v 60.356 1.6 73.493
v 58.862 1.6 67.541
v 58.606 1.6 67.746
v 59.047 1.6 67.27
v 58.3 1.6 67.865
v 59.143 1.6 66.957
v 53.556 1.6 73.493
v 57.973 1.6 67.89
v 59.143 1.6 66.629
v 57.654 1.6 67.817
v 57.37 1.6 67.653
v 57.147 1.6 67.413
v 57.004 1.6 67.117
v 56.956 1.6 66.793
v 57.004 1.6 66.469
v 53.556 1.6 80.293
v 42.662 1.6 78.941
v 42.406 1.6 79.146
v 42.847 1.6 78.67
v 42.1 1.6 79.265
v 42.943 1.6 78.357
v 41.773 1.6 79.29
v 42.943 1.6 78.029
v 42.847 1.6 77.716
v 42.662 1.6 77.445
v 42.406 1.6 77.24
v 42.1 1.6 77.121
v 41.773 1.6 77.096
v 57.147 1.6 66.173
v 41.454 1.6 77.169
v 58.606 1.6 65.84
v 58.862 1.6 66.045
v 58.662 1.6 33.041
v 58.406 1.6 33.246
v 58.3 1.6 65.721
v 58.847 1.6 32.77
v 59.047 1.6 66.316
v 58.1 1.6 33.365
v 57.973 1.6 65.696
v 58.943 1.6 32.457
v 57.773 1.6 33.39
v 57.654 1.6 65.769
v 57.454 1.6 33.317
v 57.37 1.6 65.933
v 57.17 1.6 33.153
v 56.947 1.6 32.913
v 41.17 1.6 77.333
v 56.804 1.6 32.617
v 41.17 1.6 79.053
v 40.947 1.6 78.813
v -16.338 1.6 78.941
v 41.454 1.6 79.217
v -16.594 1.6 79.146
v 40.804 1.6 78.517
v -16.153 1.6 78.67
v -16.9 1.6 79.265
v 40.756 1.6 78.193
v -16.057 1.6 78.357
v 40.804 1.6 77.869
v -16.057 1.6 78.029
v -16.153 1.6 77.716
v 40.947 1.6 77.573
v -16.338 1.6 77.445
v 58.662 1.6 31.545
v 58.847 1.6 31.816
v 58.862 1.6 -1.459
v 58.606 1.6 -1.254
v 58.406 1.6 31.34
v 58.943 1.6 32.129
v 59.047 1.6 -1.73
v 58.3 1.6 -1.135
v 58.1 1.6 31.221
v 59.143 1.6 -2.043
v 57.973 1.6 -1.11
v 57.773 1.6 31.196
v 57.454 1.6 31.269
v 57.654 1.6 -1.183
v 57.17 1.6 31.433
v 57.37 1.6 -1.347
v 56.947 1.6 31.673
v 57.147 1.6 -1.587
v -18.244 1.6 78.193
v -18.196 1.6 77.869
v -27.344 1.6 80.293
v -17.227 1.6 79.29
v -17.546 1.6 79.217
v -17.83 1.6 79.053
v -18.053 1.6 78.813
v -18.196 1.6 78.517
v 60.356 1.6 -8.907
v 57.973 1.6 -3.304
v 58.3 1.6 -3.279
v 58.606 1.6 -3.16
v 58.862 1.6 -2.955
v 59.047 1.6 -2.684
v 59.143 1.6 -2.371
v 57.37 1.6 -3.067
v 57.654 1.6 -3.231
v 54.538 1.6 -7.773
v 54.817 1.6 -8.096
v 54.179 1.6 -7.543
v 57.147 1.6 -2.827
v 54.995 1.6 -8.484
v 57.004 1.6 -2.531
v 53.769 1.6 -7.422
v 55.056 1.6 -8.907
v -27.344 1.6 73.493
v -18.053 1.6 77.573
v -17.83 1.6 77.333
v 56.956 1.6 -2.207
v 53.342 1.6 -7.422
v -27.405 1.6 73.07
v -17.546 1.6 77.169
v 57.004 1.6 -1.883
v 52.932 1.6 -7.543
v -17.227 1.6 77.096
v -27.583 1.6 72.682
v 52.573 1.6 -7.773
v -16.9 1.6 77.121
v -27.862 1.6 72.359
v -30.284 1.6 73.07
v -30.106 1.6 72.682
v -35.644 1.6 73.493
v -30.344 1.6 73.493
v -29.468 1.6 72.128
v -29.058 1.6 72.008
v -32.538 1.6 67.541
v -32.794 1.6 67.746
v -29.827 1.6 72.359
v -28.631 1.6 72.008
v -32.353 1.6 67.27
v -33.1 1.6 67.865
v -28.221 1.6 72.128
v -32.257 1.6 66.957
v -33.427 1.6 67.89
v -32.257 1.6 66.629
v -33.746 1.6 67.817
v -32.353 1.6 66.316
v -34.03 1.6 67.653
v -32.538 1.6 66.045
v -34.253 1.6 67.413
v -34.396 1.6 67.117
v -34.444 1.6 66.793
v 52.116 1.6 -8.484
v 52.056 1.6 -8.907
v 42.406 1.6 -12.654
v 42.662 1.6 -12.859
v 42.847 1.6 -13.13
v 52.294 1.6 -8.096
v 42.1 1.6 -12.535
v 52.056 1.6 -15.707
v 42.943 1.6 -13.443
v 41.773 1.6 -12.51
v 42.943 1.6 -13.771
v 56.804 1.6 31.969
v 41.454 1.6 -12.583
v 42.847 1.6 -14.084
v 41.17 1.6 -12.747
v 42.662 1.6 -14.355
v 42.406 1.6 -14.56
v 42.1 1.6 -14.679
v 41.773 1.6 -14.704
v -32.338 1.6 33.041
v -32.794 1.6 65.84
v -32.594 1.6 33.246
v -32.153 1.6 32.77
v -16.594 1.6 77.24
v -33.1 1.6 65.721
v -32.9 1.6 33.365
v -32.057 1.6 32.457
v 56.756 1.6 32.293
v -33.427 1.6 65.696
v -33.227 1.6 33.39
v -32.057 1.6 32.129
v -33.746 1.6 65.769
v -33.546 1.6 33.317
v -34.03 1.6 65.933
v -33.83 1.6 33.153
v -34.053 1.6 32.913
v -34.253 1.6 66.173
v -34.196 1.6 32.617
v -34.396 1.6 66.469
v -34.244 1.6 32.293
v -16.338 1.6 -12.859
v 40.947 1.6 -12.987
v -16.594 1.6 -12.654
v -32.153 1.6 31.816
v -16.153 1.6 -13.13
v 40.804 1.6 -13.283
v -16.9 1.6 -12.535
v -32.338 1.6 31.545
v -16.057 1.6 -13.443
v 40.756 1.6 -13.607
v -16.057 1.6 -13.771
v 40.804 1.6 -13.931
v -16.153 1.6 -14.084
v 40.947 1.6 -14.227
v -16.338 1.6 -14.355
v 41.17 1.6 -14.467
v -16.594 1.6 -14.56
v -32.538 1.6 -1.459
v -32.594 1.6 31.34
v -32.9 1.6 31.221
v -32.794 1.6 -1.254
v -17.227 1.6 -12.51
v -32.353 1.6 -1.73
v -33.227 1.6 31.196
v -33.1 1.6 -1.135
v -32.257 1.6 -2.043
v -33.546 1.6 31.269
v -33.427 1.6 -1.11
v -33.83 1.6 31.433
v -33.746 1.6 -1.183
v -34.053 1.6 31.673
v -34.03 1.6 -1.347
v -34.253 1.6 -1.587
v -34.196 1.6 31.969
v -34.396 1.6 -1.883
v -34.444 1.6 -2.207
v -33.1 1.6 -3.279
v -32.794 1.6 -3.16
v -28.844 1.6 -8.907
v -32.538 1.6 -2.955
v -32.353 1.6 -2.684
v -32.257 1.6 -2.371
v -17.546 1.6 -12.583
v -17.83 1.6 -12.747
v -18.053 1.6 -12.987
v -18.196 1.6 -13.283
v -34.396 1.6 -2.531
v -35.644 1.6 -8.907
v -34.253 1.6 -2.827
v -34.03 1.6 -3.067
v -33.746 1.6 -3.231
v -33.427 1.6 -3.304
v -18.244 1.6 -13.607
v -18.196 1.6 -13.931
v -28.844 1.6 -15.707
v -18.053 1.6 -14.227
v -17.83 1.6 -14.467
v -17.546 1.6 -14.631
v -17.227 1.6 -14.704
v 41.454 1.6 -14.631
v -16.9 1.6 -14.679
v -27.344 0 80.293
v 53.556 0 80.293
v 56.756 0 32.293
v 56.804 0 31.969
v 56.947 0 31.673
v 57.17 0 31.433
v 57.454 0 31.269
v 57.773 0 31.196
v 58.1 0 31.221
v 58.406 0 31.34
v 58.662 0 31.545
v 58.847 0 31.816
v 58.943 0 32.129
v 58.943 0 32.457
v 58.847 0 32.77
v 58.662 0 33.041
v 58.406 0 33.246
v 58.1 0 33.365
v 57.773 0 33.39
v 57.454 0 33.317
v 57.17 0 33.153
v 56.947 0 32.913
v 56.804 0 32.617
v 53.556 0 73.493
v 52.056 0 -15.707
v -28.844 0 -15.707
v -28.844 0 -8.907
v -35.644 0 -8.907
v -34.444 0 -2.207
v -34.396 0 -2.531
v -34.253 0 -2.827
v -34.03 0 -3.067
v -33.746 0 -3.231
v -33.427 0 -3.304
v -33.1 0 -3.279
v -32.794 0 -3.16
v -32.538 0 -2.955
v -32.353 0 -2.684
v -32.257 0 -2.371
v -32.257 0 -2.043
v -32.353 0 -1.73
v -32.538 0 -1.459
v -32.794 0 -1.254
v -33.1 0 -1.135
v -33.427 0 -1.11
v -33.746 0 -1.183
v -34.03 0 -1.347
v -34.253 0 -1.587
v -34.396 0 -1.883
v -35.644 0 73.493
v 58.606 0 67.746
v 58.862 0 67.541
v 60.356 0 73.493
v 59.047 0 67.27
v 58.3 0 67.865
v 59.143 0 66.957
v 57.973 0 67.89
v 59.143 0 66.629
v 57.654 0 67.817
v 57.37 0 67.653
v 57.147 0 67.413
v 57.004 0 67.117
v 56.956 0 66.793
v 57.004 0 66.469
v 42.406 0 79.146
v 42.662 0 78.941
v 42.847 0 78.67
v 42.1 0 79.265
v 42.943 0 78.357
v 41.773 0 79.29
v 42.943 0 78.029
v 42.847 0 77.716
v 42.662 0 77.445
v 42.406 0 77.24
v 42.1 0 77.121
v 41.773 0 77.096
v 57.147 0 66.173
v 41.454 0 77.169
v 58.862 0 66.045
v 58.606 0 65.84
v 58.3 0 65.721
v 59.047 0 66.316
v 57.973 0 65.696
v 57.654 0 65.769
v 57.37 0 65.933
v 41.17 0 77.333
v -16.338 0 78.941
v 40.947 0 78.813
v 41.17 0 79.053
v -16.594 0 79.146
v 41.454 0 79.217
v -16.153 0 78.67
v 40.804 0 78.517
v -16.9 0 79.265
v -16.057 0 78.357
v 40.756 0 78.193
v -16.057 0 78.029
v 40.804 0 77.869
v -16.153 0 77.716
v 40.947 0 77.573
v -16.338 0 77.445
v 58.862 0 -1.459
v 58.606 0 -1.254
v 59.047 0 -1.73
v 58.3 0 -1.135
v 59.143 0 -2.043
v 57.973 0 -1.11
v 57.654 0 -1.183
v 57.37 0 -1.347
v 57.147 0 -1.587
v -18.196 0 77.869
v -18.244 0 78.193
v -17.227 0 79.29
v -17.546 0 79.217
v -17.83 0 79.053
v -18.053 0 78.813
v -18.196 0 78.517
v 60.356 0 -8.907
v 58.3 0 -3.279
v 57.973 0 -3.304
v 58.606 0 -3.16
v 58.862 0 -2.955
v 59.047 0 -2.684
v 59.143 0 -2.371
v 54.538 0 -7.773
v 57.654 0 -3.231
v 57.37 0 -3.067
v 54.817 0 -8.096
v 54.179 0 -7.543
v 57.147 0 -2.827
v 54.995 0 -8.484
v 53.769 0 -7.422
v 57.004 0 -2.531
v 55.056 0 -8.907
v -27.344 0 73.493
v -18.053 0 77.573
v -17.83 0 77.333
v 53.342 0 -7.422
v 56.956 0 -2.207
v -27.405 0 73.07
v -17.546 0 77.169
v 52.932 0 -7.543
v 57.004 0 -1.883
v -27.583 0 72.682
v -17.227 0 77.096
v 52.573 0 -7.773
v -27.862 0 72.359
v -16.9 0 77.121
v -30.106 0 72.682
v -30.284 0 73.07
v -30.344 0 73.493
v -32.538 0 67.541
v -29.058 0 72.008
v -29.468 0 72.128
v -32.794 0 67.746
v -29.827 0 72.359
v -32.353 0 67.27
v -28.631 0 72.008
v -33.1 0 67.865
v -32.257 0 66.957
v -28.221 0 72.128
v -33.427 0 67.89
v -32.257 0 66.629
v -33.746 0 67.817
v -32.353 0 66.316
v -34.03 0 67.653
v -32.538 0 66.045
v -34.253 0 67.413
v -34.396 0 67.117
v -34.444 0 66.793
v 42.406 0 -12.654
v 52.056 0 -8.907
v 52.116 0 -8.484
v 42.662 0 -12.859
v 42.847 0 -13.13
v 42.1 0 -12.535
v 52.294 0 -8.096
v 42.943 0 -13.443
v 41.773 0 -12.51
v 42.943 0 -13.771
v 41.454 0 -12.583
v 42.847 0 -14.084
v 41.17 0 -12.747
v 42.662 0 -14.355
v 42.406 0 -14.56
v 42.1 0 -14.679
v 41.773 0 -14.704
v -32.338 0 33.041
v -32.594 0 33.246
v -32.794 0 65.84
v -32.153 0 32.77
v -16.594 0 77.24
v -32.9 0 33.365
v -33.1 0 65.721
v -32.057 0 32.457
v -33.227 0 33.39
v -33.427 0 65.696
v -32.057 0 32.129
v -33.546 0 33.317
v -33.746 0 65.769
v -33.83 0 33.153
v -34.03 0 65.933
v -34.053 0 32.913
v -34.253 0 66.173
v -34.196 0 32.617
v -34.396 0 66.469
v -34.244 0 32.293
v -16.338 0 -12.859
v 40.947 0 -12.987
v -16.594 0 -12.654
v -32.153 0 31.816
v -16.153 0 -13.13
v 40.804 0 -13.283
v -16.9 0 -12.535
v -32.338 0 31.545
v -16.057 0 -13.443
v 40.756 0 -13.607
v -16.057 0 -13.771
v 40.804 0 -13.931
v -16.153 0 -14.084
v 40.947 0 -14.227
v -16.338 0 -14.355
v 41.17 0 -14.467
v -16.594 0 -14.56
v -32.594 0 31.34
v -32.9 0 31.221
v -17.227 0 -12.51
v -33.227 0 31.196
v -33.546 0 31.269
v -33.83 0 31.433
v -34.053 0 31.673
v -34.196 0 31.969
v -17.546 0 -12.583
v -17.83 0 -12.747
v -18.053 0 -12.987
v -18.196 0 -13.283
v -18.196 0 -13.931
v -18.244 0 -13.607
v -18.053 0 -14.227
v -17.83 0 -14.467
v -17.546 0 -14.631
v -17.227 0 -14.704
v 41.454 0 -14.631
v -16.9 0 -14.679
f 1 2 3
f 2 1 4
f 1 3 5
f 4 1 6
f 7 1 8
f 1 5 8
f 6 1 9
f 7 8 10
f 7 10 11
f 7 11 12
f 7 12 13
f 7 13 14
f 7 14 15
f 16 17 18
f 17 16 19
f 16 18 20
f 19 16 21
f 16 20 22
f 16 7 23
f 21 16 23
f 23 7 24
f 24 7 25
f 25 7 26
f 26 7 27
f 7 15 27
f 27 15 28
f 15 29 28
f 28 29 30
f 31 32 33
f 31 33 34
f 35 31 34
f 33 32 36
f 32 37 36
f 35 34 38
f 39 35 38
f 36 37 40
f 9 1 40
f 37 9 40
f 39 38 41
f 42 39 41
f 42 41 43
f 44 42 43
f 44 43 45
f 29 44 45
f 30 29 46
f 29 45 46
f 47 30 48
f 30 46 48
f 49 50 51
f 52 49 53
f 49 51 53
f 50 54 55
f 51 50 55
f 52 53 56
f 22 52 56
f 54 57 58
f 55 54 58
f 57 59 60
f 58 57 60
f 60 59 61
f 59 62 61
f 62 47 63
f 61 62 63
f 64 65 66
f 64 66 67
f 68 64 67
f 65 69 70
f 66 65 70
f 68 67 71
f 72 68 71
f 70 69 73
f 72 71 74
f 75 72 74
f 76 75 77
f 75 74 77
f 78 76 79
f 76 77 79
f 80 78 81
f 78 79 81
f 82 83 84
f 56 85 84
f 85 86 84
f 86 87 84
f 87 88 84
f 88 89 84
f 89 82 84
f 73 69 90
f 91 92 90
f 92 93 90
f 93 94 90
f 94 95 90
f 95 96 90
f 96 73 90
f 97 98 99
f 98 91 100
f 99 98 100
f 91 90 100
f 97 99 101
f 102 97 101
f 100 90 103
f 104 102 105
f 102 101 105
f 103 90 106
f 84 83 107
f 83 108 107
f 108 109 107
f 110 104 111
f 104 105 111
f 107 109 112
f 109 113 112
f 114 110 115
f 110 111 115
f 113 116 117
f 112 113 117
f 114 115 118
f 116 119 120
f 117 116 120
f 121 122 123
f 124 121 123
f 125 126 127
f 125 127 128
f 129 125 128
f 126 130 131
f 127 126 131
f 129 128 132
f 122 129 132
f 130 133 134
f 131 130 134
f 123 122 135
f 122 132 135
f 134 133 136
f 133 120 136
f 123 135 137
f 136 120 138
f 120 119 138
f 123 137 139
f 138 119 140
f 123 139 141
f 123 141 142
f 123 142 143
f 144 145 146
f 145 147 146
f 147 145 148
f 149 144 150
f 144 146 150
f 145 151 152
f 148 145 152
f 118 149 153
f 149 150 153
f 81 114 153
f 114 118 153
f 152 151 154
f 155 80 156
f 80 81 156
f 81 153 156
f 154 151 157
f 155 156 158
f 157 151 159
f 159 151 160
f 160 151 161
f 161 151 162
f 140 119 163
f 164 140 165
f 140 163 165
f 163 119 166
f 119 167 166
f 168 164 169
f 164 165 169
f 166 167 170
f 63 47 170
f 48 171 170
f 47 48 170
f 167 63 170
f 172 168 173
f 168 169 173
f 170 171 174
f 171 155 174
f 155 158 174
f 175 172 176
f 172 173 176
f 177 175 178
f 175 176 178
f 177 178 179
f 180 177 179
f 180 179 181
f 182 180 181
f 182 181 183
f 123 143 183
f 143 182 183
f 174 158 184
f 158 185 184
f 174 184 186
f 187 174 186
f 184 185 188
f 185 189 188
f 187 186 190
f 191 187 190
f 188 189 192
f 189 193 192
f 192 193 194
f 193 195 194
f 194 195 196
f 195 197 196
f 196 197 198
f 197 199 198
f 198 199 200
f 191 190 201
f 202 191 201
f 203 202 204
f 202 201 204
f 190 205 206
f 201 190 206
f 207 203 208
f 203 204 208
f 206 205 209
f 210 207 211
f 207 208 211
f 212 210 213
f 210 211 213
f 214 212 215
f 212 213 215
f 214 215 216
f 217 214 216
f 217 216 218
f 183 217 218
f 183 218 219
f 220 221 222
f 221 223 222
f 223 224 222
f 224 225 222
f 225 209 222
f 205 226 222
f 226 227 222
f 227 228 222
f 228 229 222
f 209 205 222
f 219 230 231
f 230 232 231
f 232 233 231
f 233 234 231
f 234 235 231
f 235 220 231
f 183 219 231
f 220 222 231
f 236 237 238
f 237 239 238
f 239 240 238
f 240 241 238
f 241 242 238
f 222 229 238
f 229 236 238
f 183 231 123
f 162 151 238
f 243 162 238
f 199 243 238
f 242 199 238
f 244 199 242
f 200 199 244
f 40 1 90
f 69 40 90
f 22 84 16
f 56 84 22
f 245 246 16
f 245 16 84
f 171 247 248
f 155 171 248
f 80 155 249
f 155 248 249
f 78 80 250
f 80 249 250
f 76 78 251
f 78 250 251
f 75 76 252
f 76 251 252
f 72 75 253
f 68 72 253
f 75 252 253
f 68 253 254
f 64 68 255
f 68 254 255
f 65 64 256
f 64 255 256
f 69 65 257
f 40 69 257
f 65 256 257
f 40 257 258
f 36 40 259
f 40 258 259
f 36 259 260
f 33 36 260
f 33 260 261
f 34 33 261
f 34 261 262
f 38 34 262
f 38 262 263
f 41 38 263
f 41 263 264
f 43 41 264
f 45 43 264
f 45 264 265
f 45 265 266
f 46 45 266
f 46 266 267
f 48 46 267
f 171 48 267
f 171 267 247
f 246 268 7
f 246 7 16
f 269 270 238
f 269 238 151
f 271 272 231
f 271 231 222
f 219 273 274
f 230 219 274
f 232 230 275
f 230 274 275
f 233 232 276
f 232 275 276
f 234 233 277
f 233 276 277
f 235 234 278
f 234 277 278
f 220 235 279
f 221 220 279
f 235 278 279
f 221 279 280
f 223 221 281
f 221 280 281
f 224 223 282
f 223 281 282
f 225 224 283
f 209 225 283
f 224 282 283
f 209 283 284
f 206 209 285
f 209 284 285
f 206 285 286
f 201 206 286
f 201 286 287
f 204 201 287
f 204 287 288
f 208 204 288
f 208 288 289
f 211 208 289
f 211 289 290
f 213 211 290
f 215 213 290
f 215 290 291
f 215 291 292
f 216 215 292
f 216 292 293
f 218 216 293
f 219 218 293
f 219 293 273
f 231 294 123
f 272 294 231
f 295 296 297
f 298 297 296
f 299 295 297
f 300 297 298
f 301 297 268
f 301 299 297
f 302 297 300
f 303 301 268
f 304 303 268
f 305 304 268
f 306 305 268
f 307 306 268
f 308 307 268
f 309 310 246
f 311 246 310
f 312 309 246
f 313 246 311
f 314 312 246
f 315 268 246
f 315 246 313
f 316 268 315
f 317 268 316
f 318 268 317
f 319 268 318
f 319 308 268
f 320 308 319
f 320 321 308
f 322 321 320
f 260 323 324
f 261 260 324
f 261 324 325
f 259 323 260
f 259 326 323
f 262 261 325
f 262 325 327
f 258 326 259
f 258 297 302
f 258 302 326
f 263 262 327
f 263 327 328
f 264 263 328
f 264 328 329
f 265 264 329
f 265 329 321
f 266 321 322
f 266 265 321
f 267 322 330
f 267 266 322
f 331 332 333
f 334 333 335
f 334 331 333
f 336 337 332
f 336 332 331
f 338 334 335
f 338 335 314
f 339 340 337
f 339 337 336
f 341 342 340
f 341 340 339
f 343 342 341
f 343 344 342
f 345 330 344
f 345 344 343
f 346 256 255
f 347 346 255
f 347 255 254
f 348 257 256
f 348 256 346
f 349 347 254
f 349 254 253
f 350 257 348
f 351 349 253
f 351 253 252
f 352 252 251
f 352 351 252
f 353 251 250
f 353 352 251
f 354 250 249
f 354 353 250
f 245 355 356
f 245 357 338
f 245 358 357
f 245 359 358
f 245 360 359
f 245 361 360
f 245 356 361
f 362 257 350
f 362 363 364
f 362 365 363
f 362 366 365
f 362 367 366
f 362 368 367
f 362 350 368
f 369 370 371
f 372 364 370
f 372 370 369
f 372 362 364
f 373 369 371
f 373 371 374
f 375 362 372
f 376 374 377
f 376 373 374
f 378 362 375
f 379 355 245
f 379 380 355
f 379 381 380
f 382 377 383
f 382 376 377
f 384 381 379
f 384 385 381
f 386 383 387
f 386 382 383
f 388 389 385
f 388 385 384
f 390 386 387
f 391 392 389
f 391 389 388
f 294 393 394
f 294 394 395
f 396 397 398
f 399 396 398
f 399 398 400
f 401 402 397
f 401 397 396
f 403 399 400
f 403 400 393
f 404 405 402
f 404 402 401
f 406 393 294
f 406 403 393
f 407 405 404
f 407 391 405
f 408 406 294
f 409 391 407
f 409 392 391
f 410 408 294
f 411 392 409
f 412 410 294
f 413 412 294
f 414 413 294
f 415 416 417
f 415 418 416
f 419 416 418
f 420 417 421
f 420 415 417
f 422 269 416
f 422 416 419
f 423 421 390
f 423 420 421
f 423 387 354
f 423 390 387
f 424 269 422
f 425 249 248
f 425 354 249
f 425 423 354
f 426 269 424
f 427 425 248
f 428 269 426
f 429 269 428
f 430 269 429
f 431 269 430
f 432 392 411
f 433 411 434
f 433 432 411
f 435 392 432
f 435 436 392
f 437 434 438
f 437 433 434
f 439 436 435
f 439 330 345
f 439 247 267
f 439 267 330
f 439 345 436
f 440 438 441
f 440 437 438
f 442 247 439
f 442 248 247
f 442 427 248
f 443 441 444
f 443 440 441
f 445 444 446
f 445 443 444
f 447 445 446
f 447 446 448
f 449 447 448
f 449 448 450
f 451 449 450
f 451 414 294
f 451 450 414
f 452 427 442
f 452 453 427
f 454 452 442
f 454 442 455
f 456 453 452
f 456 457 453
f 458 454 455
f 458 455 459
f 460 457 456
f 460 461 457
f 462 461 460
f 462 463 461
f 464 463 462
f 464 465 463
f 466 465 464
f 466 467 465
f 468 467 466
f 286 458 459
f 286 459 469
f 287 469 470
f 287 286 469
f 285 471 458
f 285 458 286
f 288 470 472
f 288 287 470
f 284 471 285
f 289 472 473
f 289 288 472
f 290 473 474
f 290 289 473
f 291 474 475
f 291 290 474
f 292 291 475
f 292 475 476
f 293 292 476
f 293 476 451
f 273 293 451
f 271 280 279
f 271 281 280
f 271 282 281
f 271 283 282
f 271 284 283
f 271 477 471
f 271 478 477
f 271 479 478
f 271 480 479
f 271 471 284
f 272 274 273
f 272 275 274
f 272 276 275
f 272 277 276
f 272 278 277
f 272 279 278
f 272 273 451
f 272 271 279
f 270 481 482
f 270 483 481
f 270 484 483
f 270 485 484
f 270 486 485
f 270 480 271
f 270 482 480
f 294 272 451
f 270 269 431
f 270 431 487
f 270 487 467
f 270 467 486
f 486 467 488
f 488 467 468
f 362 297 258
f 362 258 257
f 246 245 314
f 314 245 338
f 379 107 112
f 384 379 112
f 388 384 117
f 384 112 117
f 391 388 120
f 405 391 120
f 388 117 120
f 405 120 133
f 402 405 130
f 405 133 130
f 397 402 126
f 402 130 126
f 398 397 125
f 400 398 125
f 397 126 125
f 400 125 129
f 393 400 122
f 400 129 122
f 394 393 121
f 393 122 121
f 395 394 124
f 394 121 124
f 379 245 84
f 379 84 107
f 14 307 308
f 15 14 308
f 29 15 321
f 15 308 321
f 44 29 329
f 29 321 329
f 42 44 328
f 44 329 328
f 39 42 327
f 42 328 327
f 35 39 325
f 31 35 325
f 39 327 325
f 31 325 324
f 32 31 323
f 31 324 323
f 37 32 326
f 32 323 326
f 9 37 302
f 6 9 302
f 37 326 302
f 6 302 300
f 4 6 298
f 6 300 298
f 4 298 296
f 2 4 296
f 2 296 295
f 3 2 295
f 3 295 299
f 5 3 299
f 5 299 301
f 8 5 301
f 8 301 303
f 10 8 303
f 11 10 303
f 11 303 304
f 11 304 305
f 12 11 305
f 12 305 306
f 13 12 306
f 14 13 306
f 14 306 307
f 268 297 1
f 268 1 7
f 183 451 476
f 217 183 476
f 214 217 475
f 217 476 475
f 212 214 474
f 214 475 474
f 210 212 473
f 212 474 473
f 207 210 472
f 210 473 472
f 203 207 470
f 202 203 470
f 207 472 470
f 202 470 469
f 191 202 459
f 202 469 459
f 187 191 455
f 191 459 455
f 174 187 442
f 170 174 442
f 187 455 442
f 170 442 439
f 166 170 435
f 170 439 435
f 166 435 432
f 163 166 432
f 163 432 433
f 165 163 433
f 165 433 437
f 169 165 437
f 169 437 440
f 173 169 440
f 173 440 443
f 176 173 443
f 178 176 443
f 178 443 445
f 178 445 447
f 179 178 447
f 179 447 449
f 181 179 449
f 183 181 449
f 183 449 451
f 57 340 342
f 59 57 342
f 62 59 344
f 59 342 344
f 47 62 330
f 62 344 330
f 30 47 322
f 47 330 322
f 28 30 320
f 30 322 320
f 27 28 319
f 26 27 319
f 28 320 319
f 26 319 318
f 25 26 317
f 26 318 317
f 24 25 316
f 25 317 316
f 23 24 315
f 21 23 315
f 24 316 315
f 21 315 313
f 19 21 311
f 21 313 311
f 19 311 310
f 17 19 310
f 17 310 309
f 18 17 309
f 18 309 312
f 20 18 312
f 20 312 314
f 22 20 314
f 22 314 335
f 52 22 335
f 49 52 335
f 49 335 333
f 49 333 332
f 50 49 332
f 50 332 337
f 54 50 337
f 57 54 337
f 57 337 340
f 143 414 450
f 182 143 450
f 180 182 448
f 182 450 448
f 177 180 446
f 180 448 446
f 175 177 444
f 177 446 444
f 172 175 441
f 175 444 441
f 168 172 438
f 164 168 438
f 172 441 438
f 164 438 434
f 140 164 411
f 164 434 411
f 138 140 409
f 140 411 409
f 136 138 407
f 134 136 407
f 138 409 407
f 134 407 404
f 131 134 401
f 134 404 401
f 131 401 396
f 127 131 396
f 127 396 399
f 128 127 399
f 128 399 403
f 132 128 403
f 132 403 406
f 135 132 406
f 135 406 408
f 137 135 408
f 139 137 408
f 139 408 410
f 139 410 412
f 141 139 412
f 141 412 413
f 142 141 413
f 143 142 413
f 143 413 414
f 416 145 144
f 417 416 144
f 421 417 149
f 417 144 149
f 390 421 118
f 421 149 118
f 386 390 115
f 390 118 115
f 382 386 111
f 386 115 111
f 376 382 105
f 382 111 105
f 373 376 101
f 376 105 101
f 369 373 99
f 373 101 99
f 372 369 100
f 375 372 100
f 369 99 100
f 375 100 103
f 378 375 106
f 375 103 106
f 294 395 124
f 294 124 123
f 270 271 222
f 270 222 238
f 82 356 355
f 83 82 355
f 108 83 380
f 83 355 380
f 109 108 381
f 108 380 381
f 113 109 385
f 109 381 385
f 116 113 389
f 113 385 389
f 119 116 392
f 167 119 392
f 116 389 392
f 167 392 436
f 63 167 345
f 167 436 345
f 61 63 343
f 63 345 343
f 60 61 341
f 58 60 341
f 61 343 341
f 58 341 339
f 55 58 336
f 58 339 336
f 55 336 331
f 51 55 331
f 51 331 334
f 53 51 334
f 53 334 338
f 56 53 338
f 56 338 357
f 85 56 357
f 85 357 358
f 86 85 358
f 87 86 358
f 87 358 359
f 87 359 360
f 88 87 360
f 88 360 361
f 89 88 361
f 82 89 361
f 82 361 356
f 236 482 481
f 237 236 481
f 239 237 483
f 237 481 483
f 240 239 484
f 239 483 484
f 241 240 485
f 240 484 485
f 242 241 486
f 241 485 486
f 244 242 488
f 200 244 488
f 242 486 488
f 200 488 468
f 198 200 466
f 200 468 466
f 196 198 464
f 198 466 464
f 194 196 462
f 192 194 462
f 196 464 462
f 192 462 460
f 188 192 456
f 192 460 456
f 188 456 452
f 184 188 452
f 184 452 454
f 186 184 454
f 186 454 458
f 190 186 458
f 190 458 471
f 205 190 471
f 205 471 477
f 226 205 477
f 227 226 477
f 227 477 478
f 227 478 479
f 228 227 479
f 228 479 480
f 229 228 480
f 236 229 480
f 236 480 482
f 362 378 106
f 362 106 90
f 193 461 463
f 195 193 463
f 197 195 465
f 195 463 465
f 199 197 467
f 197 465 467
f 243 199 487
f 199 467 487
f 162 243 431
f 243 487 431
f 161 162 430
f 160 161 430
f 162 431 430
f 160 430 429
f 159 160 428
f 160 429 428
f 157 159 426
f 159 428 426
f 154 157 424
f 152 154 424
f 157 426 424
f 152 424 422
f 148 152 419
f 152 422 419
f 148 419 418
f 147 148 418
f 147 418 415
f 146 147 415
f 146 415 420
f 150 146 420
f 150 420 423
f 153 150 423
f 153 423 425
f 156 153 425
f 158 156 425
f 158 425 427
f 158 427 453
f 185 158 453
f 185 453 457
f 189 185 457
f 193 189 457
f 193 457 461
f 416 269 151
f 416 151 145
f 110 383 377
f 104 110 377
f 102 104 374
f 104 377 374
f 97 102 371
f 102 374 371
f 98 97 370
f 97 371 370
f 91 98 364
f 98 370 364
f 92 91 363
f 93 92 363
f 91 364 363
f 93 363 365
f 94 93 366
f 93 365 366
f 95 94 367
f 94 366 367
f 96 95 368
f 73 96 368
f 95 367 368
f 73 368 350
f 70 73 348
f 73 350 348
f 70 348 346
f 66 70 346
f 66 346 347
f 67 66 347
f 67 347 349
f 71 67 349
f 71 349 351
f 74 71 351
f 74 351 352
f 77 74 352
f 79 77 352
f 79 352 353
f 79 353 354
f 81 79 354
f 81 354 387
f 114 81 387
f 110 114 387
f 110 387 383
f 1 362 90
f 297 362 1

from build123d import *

# Parameters (mm, degrees)
BOSS_EXTRUDE1_DEPTH         = 1.6
HOLE_WIZARD_2_2_2_2_1_D     = 2.2
HOLE_WIZARD_2_2_2_2_1_DEPTH = 2
SKETCH12_R                  = 1.5
CUT_EXTRUDE1_DEPTH          = 2.6
HOLE_WIZARD_2_2_2_2_2_D     = 2.2
HOLE_WIZARD_2_2_2_2_2_DEPTH = 1.6


with BuildPart() as part:
    # Sketch1 → Boss-Extrude1 (new body)
    with BuildSketch(Plane(origin=(0, 0, 0), x_dir=(1, 0, 0), z_dir=(0, 1, 0))):
        Polygon((-35.644384454, 8.907074992), (-28.844384454, 8.907074992), (-28.844384454, 15.707074992), (52.055615546, 15.707074992), (52.055615546, 8.907074992), (60.355615546, 8.907074992), (60.355615546, -73.492925008), (53.555615546, -73.492925008), (53.555615546, -80.292925008), (-27.344384454, -80.292925008), (-27.344384454, -73.492925008), (-35.644384454, -73.492925008), align=None)
    extrude(amount=BOSS_EXTRUDE1_DEPTH)

    # Ø2.2 (2.2) 直径の穴1
    with Locations(Plane(origin=(0, 1.6, 0), x_dir=(1, 0, 0), z_dir=(0, 1, 0))):
        with Locations((57.855615546, -32.292925008), (-33.144384454, -32.292925008), (41.855615546, -78.192925008), (41.855615546, 13.607074992), (-17.144384454, 13.607074992), (-17.144384454, -78.192925008)):
            Hole(HOLE_WIZARD_2_2_2_2_1_D / 2, depth=HOLE_WIZARD_2_2_2_2_1_DEPTH)

    # Sketch12 → Cut-Extrude1 (cut, through all)
    with BuildSketch(Plane(origin=(0, 1.6, 0), x_dir=(1, 0, 0), z_dir=(0, 1, 0))):
        with Locations((53.555615546, 8.907074992)):
            Circle(SKETCH12_R)
        with Locations((-28.844384454, -73.492925008)):
            Circle(SKETCH12_R)
    extrude(amount=-CUT_EXTRUDE1_DEPTH, mode=Mode.SUBTRACT)

    # Ø2.2 (2.2) 直径の穴2
    with Locations(Plane(origin=(0, 1.6, 0), x_dir=(1, 0, 0), z_dir=(0, 1, 0))):
        with Locations((-33.344384454, 2.207074992), (-33.344384454, -66.792925008), (58.055615546, -66.792925008), (58.055615546, 2.207074992)):
            Hole(HOLE_WIZARD_2_2_2_2_2_D / 2, depth=HOLE_WIZARD_2_2_2_2_2_DEPTH)


solid = part.part
